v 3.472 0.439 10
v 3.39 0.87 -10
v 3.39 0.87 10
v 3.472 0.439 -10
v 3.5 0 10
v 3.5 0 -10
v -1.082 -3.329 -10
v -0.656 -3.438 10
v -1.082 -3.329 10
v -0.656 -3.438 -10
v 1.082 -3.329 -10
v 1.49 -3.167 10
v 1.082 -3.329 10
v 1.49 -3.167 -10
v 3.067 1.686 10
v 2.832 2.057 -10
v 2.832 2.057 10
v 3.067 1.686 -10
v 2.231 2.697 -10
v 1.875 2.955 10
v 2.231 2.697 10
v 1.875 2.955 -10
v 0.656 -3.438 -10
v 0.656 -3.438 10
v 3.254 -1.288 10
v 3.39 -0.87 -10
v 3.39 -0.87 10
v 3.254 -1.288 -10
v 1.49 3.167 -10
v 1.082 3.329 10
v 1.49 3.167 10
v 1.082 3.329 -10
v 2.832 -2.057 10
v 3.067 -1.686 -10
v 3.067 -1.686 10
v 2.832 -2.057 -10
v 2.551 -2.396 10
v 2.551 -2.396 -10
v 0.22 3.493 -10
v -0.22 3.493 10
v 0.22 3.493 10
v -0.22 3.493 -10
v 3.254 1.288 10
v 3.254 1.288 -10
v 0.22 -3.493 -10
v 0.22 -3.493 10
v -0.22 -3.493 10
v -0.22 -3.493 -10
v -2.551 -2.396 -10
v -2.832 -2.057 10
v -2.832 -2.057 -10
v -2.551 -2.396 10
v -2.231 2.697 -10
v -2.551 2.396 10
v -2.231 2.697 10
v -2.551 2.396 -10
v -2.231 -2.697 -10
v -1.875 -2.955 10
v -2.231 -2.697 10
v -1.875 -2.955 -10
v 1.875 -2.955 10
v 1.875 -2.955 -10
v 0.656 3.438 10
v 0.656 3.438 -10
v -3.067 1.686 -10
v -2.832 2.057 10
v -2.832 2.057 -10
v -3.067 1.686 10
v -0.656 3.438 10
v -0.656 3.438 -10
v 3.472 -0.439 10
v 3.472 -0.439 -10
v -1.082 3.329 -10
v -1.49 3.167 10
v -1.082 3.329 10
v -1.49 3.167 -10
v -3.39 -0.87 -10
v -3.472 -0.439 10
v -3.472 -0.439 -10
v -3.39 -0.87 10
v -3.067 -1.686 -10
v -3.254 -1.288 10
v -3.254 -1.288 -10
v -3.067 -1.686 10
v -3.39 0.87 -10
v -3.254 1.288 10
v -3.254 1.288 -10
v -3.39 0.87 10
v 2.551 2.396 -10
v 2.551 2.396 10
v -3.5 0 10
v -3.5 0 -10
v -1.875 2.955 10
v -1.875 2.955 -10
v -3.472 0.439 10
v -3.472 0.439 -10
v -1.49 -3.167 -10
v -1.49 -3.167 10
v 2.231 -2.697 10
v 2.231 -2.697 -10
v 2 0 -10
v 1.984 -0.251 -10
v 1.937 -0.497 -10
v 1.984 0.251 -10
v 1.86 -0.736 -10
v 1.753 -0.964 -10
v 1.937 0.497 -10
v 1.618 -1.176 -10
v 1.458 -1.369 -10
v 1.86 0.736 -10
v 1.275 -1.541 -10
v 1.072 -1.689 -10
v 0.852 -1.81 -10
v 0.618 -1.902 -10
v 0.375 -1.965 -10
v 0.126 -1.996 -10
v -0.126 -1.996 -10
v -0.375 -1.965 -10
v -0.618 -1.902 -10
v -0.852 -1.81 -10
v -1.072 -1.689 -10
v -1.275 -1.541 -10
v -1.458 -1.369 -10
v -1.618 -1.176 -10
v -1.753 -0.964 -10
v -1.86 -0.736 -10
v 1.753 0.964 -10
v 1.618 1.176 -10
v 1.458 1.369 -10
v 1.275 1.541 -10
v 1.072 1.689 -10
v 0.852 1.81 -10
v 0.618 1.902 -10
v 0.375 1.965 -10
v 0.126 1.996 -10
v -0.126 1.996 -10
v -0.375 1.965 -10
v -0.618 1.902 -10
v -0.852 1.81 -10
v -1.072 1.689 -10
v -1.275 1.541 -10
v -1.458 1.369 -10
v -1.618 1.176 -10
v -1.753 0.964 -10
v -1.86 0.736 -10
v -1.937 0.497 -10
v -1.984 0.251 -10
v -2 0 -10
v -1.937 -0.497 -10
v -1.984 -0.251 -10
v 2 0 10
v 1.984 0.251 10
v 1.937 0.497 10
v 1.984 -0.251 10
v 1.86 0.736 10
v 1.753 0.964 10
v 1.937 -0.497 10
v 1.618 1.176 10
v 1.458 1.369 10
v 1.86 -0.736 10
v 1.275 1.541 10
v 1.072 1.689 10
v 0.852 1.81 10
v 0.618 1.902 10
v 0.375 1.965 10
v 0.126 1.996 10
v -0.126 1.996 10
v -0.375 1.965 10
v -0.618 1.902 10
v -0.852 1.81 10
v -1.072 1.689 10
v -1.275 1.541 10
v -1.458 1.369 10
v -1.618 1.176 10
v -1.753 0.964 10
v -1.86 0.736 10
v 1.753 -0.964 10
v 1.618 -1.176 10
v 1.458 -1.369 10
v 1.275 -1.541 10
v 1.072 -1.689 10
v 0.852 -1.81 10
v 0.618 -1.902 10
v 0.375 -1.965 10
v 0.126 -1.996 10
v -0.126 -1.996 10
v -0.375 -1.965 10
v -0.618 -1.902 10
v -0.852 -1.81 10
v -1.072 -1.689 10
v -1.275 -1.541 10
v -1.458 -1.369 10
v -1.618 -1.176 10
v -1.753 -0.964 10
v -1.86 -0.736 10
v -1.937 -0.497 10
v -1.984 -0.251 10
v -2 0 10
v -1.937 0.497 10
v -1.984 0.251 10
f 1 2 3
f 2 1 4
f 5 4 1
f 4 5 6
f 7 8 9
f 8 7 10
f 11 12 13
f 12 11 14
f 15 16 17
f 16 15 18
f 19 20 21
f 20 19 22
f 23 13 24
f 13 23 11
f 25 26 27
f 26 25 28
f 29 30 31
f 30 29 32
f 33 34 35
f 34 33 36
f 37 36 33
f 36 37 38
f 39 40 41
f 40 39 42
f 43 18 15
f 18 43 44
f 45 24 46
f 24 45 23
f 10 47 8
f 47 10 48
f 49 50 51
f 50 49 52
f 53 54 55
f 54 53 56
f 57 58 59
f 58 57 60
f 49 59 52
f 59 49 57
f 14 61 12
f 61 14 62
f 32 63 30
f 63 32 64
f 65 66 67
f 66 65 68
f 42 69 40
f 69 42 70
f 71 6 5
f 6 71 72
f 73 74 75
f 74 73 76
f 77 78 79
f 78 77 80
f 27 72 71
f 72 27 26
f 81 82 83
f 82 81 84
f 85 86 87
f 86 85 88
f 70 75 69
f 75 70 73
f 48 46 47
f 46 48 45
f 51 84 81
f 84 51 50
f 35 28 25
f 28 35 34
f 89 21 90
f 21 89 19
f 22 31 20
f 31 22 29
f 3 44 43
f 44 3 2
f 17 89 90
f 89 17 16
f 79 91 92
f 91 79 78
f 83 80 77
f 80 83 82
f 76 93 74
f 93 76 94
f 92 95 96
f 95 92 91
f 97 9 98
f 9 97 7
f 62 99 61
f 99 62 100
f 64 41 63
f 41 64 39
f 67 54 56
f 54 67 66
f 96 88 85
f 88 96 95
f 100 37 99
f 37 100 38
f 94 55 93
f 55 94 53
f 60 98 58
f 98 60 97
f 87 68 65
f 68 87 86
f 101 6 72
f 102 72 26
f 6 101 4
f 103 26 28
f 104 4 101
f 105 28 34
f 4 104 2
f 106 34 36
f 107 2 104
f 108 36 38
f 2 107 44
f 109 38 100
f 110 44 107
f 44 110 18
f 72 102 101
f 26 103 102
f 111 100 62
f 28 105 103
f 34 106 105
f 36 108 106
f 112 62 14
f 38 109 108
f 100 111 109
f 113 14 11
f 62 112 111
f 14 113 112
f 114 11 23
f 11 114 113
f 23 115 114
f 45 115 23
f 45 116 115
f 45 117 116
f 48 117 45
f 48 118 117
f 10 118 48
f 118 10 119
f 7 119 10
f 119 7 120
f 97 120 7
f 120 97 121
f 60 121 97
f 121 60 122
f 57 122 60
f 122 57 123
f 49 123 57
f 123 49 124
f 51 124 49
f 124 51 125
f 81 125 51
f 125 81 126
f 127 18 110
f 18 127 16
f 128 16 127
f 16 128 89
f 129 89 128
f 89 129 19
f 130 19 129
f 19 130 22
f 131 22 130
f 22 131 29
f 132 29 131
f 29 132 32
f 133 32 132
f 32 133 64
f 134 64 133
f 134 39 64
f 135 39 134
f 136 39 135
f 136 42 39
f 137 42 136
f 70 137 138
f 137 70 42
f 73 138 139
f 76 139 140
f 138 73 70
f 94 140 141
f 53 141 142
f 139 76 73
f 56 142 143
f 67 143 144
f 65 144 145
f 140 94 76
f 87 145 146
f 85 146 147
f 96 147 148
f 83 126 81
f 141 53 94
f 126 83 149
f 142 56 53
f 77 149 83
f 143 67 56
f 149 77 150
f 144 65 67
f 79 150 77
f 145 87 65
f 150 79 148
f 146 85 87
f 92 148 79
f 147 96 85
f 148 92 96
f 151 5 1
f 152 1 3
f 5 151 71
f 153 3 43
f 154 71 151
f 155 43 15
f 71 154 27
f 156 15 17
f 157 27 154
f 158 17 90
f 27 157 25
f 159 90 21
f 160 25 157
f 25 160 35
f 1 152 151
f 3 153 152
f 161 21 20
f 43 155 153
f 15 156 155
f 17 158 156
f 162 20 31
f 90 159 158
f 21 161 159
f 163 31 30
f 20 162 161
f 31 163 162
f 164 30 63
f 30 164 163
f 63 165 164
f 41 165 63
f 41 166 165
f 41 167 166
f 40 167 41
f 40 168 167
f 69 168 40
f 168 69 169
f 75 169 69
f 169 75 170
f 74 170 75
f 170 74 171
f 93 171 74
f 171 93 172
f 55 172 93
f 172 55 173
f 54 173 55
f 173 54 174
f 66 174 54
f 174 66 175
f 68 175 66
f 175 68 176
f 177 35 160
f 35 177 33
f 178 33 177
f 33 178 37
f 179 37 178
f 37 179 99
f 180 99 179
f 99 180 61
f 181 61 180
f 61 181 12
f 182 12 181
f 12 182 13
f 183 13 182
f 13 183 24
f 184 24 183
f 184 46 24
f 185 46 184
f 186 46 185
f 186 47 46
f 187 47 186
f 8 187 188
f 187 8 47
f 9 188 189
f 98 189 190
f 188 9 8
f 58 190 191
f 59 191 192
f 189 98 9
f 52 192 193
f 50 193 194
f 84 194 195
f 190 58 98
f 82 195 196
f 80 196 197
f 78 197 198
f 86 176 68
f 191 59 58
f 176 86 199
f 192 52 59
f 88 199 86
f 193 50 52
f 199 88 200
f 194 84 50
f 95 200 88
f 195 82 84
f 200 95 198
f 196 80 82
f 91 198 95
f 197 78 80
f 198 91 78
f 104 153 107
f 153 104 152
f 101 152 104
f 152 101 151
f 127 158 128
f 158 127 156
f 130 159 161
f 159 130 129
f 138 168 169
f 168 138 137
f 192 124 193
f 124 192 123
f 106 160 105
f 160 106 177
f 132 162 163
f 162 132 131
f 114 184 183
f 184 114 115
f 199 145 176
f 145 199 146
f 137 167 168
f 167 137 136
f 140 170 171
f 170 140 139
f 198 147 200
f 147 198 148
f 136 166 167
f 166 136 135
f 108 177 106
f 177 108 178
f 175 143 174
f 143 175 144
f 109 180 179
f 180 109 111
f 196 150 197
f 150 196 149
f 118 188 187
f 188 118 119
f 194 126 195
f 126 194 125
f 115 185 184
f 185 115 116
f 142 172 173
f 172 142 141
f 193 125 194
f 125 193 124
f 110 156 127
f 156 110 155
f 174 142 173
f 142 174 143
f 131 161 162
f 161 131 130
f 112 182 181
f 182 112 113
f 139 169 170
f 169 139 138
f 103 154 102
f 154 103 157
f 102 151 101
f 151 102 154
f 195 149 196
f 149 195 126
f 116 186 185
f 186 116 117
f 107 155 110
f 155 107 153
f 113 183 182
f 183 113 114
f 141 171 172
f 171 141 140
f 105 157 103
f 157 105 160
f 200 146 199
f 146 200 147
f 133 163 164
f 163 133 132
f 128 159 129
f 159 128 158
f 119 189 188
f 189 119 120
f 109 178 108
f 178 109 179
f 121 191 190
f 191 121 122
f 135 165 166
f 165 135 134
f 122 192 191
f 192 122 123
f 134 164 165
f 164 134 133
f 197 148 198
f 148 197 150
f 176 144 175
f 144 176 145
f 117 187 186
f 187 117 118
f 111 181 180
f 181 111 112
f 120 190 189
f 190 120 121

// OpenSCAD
$fn = 50;


difference() {
	union() {
		translate(v = [0, 0, -10.0000000000]) {
			cylinder(h = 20, r = 3.5000000000);
		}
	}
	union() {
		translate(v = [0, 0, -100.0000000000]) {
			cylinder(h = 200, r = 2.0000000000);
		}
	}
}
